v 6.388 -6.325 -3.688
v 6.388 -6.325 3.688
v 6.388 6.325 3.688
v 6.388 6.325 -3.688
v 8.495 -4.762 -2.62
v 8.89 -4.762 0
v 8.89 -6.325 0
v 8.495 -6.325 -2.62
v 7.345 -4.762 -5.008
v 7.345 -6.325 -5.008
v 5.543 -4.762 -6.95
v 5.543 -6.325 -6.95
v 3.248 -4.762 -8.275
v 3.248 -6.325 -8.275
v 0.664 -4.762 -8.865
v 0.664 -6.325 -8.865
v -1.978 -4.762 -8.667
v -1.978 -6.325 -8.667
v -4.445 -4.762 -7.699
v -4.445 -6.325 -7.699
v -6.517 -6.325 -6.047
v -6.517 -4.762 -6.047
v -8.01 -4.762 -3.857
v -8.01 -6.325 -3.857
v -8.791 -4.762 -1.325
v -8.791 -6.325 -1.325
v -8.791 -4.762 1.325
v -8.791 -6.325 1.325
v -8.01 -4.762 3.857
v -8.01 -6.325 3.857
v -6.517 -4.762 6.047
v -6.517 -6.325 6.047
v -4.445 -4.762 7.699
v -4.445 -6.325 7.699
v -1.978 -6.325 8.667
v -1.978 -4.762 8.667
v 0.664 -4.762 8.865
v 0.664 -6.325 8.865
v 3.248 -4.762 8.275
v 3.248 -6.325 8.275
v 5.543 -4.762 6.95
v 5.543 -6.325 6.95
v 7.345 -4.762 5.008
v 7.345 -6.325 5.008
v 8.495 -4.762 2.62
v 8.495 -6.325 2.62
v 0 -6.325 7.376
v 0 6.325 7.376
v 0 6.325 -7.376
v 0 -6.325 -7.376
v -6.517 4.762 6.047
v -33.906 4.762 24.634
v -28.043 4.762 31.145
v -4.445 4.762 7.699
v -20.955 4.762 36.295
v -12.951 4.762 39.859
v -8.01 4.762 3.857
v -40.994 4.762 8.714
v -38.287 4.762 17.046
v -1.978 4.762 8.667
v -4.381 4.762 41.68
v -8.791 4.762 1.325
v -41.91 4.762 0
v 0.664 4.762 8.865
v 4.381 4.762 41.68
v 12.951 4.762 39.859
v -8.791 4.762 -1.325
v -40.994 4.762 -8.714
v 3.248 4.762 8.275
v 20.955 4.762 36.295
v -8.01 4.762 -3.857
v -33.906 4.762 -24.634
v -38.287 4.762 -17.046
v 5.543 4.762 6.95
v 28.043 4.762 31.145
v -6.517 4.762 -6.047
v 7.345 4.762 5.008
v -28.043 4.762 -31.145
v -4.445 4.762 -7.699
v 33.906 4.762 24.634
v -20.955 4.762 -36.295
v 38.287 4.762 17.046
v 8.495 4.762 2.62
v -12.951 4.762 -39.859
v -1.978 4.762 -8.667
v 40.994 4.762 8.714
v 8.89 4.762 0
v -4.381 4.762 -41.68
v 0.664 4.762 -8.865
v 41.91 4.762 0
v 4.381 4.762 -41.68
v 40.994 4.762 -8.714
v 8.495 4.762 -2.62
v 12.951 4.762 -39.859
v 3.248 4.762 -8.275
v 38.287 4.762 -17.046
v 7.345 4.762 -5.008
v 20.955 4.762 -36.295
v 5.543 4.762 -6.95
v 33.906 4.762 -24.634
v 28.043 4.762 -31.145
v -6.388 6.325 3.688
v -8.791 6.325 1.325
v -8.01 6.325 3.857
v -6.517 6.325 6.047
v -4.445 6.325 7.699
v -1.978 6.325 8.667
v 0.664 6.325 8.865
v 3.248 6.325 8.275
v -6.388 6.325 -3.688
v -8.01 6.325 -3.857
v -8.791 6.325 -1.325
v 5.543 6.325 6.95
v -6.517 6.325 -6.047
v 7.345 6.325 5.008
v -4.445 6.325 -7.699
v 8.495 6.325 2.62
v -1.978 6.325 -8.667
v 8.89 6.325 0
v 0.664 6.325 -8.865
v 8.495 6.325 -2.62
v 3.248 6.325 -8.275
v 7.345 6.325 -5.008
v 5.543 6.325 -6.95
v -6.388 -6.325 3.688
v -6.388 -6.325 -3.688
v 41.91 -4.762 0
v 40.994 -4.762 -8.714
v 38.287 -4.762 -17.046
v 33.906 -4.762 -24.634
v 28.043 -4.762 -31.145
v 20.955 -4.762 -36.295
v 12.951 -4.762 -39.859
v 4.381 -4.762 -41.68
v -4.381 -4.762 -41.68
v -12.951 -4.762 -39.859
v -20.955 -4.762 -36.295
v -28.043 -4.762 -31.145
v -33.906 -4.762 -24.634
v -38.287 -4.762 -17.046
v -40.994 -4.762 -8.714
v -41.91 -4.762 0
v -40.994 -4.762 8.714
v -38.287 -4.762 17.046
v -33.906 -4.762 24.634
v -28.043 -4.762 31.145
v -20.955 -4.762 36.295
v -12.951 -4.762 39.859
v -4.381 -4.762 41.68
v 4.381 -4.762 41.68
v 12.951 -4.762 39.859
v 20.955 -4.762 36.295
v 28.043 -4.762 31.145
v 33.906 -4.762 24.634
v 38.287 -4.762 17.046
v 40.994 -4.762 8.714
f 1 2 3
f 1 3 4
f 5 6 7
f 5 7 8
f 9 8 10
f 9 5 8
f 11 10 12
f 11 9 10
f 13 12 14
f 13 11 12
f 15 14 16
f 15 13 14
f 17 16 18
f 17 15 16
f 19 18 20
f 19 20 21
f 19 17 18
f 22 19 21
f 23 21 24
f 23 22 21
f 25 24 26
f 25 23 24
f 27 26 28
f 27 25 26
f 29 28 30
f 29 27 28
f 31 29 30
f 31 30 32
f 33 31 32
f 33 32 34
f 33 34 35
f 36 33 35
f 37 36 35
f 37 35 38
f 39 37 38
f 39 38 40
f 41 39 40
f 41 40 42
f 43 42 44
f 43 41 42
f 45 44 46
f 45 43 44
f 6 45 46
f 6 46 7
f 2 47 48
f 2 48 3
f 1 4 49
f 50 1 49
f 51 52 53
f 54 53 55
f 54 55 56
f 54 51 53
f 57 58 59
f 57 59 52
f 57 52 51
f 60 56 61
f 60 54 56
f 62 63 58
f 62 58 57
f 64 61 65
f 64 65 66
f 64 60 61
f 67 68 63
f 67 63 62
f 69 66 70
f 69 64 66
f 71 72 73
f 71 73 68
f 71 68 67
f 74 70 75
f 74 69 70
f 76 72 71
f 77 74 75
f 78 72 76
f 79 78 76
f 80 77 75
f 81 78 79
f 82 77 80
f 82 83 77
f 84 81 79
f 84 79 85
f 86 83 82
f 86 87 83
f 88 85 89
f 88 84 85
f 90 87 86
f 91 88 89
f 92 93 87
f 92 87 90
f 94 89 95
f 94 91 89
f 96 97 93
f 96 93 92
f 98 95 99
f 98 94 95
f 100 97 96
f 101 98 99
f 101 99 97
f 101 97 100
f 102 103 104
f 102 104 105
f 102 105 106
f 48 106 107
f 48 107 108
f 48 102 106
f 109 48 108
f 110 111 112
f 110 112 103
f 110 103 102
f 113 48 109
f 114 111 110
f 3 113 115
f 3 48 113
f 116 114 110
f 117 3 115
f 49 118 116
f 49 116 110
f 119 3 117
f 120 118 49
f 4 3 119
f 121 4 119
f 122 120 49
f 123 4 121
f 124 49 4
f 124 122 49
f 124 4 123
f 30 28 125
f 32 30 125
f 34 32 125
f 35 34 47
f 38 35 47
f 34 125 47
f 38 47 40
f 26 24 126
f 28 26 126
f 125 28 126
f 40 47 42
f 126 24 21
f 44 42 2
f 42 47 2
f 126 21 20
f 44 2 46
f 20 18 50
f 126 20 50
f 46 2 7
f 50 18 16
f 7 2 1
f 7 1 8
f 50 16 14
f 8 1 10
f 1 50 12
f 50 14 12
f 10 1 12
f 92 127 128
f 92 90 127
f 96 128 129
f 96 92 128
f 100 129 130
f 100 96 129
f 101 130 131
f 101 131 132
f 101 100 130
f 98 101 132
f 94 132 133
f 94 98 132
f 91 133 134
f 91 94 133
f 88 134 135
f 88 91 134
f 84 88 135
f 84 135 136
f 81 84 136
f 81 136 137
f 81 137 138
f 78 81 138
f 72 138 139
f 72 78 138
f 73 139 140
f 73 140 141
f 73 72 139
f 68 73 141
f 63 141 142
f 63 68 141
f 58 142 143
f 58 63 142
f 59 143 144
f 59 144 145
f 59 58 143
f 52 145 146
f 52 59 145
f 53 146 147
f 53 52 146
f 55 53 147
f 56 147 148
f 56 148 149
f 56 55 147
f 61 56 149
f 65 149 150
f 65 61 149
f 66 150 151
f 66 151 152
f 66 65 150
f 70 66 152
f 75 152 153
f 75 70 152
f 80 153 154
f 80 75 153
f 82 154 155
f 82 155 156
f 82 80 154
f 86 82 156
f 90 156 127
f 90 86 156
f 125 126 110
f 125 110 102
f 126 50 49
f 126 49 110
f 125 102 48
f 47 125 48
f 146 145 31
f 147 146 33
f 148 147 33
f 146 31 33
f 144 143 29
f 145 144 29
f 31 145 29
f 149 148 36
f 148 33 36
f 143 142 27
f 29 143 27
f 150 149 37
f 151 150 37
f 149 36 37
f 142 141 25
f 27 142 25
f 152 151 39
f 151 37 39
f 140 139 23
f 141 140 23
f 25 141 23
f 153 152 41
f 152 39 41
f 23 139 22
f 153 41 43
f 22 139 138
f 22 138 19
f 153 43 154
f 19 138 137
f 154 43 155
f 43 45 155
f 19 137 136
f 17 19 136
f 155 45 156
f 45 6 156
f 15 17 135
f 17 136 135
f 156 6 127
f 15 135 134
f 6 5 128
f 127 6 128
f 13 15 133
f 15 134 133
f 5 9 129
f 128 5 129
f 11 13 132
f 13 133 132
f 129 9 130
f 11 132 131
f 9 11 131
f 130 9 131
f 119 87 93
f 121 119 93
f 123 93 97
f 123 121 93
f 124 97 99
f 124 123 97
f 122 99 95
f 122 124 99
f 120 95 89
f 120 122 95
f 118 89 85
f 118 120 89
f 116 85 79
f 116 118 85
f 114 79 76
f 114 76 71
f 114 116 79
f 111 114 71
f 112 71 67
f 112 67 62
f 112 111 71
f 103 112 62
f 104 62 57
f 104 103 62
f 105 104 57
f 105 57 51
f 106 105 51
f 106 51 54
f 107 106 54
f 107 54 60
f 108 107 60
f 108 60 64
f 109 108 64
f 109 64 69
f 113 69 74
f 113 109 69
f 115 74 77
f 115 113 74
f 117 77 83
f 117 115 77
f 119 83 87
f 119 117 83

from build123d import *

# Parameters (mm, degrees)
SKETCH1_R           = 41.91
BOSS_EXTRUDE1_DEPTH = 4.7625
SKETCH2_R           = 8.89
BOSS_EXTRUDE2_DEPTH = 6.3246
CUT_EXTRUDE1_DEPTH  = 13.6492


with BuildPart() as part:
    # Sketch1 → Boss-Extrude1 (new body, symmetric)
    with BuildSketch(Plane(origin=(0, 0, 0), x_dir=(1, 0, 0), z_dir=(0, 1, 0))):
        Circle(SKETCH1_R)
    extrude(amount=BOSS_EXTRUDE1_DEPTH, both=True)

    # Sketch2 → Boss-Extrude2 (add, symmetric)
    with BuildSketch(Plane(origin=(0, 0, 0), x_dir=(1, 0, 0), z_dir=(0, 1, 0))):
        Circle(SKETCH2_R)
    extrude(amount=BOSS_EXTRUDE2_DEPTH, both=True)

    # Sketch3 → Cut-Extrude1 (cut, through all)
    with BuildSketch(Plane(origin=(0, 6.3246, 0), x_dir=(1, 0, 0), z_dir=(0, 1, 0))):
        Polygon((0, 7.376342509), (-6.3881, 3.688171255), (-6.3881, -3.688171255), (0, -7.376342509), (6.3881, -3.688171255), (6.3881, 3.688171255), align=None)
    extrude(amount=-CUT_EXTRUDE1_DEPTH, mode=Mode.SUBTRACT)


solid = part.part
